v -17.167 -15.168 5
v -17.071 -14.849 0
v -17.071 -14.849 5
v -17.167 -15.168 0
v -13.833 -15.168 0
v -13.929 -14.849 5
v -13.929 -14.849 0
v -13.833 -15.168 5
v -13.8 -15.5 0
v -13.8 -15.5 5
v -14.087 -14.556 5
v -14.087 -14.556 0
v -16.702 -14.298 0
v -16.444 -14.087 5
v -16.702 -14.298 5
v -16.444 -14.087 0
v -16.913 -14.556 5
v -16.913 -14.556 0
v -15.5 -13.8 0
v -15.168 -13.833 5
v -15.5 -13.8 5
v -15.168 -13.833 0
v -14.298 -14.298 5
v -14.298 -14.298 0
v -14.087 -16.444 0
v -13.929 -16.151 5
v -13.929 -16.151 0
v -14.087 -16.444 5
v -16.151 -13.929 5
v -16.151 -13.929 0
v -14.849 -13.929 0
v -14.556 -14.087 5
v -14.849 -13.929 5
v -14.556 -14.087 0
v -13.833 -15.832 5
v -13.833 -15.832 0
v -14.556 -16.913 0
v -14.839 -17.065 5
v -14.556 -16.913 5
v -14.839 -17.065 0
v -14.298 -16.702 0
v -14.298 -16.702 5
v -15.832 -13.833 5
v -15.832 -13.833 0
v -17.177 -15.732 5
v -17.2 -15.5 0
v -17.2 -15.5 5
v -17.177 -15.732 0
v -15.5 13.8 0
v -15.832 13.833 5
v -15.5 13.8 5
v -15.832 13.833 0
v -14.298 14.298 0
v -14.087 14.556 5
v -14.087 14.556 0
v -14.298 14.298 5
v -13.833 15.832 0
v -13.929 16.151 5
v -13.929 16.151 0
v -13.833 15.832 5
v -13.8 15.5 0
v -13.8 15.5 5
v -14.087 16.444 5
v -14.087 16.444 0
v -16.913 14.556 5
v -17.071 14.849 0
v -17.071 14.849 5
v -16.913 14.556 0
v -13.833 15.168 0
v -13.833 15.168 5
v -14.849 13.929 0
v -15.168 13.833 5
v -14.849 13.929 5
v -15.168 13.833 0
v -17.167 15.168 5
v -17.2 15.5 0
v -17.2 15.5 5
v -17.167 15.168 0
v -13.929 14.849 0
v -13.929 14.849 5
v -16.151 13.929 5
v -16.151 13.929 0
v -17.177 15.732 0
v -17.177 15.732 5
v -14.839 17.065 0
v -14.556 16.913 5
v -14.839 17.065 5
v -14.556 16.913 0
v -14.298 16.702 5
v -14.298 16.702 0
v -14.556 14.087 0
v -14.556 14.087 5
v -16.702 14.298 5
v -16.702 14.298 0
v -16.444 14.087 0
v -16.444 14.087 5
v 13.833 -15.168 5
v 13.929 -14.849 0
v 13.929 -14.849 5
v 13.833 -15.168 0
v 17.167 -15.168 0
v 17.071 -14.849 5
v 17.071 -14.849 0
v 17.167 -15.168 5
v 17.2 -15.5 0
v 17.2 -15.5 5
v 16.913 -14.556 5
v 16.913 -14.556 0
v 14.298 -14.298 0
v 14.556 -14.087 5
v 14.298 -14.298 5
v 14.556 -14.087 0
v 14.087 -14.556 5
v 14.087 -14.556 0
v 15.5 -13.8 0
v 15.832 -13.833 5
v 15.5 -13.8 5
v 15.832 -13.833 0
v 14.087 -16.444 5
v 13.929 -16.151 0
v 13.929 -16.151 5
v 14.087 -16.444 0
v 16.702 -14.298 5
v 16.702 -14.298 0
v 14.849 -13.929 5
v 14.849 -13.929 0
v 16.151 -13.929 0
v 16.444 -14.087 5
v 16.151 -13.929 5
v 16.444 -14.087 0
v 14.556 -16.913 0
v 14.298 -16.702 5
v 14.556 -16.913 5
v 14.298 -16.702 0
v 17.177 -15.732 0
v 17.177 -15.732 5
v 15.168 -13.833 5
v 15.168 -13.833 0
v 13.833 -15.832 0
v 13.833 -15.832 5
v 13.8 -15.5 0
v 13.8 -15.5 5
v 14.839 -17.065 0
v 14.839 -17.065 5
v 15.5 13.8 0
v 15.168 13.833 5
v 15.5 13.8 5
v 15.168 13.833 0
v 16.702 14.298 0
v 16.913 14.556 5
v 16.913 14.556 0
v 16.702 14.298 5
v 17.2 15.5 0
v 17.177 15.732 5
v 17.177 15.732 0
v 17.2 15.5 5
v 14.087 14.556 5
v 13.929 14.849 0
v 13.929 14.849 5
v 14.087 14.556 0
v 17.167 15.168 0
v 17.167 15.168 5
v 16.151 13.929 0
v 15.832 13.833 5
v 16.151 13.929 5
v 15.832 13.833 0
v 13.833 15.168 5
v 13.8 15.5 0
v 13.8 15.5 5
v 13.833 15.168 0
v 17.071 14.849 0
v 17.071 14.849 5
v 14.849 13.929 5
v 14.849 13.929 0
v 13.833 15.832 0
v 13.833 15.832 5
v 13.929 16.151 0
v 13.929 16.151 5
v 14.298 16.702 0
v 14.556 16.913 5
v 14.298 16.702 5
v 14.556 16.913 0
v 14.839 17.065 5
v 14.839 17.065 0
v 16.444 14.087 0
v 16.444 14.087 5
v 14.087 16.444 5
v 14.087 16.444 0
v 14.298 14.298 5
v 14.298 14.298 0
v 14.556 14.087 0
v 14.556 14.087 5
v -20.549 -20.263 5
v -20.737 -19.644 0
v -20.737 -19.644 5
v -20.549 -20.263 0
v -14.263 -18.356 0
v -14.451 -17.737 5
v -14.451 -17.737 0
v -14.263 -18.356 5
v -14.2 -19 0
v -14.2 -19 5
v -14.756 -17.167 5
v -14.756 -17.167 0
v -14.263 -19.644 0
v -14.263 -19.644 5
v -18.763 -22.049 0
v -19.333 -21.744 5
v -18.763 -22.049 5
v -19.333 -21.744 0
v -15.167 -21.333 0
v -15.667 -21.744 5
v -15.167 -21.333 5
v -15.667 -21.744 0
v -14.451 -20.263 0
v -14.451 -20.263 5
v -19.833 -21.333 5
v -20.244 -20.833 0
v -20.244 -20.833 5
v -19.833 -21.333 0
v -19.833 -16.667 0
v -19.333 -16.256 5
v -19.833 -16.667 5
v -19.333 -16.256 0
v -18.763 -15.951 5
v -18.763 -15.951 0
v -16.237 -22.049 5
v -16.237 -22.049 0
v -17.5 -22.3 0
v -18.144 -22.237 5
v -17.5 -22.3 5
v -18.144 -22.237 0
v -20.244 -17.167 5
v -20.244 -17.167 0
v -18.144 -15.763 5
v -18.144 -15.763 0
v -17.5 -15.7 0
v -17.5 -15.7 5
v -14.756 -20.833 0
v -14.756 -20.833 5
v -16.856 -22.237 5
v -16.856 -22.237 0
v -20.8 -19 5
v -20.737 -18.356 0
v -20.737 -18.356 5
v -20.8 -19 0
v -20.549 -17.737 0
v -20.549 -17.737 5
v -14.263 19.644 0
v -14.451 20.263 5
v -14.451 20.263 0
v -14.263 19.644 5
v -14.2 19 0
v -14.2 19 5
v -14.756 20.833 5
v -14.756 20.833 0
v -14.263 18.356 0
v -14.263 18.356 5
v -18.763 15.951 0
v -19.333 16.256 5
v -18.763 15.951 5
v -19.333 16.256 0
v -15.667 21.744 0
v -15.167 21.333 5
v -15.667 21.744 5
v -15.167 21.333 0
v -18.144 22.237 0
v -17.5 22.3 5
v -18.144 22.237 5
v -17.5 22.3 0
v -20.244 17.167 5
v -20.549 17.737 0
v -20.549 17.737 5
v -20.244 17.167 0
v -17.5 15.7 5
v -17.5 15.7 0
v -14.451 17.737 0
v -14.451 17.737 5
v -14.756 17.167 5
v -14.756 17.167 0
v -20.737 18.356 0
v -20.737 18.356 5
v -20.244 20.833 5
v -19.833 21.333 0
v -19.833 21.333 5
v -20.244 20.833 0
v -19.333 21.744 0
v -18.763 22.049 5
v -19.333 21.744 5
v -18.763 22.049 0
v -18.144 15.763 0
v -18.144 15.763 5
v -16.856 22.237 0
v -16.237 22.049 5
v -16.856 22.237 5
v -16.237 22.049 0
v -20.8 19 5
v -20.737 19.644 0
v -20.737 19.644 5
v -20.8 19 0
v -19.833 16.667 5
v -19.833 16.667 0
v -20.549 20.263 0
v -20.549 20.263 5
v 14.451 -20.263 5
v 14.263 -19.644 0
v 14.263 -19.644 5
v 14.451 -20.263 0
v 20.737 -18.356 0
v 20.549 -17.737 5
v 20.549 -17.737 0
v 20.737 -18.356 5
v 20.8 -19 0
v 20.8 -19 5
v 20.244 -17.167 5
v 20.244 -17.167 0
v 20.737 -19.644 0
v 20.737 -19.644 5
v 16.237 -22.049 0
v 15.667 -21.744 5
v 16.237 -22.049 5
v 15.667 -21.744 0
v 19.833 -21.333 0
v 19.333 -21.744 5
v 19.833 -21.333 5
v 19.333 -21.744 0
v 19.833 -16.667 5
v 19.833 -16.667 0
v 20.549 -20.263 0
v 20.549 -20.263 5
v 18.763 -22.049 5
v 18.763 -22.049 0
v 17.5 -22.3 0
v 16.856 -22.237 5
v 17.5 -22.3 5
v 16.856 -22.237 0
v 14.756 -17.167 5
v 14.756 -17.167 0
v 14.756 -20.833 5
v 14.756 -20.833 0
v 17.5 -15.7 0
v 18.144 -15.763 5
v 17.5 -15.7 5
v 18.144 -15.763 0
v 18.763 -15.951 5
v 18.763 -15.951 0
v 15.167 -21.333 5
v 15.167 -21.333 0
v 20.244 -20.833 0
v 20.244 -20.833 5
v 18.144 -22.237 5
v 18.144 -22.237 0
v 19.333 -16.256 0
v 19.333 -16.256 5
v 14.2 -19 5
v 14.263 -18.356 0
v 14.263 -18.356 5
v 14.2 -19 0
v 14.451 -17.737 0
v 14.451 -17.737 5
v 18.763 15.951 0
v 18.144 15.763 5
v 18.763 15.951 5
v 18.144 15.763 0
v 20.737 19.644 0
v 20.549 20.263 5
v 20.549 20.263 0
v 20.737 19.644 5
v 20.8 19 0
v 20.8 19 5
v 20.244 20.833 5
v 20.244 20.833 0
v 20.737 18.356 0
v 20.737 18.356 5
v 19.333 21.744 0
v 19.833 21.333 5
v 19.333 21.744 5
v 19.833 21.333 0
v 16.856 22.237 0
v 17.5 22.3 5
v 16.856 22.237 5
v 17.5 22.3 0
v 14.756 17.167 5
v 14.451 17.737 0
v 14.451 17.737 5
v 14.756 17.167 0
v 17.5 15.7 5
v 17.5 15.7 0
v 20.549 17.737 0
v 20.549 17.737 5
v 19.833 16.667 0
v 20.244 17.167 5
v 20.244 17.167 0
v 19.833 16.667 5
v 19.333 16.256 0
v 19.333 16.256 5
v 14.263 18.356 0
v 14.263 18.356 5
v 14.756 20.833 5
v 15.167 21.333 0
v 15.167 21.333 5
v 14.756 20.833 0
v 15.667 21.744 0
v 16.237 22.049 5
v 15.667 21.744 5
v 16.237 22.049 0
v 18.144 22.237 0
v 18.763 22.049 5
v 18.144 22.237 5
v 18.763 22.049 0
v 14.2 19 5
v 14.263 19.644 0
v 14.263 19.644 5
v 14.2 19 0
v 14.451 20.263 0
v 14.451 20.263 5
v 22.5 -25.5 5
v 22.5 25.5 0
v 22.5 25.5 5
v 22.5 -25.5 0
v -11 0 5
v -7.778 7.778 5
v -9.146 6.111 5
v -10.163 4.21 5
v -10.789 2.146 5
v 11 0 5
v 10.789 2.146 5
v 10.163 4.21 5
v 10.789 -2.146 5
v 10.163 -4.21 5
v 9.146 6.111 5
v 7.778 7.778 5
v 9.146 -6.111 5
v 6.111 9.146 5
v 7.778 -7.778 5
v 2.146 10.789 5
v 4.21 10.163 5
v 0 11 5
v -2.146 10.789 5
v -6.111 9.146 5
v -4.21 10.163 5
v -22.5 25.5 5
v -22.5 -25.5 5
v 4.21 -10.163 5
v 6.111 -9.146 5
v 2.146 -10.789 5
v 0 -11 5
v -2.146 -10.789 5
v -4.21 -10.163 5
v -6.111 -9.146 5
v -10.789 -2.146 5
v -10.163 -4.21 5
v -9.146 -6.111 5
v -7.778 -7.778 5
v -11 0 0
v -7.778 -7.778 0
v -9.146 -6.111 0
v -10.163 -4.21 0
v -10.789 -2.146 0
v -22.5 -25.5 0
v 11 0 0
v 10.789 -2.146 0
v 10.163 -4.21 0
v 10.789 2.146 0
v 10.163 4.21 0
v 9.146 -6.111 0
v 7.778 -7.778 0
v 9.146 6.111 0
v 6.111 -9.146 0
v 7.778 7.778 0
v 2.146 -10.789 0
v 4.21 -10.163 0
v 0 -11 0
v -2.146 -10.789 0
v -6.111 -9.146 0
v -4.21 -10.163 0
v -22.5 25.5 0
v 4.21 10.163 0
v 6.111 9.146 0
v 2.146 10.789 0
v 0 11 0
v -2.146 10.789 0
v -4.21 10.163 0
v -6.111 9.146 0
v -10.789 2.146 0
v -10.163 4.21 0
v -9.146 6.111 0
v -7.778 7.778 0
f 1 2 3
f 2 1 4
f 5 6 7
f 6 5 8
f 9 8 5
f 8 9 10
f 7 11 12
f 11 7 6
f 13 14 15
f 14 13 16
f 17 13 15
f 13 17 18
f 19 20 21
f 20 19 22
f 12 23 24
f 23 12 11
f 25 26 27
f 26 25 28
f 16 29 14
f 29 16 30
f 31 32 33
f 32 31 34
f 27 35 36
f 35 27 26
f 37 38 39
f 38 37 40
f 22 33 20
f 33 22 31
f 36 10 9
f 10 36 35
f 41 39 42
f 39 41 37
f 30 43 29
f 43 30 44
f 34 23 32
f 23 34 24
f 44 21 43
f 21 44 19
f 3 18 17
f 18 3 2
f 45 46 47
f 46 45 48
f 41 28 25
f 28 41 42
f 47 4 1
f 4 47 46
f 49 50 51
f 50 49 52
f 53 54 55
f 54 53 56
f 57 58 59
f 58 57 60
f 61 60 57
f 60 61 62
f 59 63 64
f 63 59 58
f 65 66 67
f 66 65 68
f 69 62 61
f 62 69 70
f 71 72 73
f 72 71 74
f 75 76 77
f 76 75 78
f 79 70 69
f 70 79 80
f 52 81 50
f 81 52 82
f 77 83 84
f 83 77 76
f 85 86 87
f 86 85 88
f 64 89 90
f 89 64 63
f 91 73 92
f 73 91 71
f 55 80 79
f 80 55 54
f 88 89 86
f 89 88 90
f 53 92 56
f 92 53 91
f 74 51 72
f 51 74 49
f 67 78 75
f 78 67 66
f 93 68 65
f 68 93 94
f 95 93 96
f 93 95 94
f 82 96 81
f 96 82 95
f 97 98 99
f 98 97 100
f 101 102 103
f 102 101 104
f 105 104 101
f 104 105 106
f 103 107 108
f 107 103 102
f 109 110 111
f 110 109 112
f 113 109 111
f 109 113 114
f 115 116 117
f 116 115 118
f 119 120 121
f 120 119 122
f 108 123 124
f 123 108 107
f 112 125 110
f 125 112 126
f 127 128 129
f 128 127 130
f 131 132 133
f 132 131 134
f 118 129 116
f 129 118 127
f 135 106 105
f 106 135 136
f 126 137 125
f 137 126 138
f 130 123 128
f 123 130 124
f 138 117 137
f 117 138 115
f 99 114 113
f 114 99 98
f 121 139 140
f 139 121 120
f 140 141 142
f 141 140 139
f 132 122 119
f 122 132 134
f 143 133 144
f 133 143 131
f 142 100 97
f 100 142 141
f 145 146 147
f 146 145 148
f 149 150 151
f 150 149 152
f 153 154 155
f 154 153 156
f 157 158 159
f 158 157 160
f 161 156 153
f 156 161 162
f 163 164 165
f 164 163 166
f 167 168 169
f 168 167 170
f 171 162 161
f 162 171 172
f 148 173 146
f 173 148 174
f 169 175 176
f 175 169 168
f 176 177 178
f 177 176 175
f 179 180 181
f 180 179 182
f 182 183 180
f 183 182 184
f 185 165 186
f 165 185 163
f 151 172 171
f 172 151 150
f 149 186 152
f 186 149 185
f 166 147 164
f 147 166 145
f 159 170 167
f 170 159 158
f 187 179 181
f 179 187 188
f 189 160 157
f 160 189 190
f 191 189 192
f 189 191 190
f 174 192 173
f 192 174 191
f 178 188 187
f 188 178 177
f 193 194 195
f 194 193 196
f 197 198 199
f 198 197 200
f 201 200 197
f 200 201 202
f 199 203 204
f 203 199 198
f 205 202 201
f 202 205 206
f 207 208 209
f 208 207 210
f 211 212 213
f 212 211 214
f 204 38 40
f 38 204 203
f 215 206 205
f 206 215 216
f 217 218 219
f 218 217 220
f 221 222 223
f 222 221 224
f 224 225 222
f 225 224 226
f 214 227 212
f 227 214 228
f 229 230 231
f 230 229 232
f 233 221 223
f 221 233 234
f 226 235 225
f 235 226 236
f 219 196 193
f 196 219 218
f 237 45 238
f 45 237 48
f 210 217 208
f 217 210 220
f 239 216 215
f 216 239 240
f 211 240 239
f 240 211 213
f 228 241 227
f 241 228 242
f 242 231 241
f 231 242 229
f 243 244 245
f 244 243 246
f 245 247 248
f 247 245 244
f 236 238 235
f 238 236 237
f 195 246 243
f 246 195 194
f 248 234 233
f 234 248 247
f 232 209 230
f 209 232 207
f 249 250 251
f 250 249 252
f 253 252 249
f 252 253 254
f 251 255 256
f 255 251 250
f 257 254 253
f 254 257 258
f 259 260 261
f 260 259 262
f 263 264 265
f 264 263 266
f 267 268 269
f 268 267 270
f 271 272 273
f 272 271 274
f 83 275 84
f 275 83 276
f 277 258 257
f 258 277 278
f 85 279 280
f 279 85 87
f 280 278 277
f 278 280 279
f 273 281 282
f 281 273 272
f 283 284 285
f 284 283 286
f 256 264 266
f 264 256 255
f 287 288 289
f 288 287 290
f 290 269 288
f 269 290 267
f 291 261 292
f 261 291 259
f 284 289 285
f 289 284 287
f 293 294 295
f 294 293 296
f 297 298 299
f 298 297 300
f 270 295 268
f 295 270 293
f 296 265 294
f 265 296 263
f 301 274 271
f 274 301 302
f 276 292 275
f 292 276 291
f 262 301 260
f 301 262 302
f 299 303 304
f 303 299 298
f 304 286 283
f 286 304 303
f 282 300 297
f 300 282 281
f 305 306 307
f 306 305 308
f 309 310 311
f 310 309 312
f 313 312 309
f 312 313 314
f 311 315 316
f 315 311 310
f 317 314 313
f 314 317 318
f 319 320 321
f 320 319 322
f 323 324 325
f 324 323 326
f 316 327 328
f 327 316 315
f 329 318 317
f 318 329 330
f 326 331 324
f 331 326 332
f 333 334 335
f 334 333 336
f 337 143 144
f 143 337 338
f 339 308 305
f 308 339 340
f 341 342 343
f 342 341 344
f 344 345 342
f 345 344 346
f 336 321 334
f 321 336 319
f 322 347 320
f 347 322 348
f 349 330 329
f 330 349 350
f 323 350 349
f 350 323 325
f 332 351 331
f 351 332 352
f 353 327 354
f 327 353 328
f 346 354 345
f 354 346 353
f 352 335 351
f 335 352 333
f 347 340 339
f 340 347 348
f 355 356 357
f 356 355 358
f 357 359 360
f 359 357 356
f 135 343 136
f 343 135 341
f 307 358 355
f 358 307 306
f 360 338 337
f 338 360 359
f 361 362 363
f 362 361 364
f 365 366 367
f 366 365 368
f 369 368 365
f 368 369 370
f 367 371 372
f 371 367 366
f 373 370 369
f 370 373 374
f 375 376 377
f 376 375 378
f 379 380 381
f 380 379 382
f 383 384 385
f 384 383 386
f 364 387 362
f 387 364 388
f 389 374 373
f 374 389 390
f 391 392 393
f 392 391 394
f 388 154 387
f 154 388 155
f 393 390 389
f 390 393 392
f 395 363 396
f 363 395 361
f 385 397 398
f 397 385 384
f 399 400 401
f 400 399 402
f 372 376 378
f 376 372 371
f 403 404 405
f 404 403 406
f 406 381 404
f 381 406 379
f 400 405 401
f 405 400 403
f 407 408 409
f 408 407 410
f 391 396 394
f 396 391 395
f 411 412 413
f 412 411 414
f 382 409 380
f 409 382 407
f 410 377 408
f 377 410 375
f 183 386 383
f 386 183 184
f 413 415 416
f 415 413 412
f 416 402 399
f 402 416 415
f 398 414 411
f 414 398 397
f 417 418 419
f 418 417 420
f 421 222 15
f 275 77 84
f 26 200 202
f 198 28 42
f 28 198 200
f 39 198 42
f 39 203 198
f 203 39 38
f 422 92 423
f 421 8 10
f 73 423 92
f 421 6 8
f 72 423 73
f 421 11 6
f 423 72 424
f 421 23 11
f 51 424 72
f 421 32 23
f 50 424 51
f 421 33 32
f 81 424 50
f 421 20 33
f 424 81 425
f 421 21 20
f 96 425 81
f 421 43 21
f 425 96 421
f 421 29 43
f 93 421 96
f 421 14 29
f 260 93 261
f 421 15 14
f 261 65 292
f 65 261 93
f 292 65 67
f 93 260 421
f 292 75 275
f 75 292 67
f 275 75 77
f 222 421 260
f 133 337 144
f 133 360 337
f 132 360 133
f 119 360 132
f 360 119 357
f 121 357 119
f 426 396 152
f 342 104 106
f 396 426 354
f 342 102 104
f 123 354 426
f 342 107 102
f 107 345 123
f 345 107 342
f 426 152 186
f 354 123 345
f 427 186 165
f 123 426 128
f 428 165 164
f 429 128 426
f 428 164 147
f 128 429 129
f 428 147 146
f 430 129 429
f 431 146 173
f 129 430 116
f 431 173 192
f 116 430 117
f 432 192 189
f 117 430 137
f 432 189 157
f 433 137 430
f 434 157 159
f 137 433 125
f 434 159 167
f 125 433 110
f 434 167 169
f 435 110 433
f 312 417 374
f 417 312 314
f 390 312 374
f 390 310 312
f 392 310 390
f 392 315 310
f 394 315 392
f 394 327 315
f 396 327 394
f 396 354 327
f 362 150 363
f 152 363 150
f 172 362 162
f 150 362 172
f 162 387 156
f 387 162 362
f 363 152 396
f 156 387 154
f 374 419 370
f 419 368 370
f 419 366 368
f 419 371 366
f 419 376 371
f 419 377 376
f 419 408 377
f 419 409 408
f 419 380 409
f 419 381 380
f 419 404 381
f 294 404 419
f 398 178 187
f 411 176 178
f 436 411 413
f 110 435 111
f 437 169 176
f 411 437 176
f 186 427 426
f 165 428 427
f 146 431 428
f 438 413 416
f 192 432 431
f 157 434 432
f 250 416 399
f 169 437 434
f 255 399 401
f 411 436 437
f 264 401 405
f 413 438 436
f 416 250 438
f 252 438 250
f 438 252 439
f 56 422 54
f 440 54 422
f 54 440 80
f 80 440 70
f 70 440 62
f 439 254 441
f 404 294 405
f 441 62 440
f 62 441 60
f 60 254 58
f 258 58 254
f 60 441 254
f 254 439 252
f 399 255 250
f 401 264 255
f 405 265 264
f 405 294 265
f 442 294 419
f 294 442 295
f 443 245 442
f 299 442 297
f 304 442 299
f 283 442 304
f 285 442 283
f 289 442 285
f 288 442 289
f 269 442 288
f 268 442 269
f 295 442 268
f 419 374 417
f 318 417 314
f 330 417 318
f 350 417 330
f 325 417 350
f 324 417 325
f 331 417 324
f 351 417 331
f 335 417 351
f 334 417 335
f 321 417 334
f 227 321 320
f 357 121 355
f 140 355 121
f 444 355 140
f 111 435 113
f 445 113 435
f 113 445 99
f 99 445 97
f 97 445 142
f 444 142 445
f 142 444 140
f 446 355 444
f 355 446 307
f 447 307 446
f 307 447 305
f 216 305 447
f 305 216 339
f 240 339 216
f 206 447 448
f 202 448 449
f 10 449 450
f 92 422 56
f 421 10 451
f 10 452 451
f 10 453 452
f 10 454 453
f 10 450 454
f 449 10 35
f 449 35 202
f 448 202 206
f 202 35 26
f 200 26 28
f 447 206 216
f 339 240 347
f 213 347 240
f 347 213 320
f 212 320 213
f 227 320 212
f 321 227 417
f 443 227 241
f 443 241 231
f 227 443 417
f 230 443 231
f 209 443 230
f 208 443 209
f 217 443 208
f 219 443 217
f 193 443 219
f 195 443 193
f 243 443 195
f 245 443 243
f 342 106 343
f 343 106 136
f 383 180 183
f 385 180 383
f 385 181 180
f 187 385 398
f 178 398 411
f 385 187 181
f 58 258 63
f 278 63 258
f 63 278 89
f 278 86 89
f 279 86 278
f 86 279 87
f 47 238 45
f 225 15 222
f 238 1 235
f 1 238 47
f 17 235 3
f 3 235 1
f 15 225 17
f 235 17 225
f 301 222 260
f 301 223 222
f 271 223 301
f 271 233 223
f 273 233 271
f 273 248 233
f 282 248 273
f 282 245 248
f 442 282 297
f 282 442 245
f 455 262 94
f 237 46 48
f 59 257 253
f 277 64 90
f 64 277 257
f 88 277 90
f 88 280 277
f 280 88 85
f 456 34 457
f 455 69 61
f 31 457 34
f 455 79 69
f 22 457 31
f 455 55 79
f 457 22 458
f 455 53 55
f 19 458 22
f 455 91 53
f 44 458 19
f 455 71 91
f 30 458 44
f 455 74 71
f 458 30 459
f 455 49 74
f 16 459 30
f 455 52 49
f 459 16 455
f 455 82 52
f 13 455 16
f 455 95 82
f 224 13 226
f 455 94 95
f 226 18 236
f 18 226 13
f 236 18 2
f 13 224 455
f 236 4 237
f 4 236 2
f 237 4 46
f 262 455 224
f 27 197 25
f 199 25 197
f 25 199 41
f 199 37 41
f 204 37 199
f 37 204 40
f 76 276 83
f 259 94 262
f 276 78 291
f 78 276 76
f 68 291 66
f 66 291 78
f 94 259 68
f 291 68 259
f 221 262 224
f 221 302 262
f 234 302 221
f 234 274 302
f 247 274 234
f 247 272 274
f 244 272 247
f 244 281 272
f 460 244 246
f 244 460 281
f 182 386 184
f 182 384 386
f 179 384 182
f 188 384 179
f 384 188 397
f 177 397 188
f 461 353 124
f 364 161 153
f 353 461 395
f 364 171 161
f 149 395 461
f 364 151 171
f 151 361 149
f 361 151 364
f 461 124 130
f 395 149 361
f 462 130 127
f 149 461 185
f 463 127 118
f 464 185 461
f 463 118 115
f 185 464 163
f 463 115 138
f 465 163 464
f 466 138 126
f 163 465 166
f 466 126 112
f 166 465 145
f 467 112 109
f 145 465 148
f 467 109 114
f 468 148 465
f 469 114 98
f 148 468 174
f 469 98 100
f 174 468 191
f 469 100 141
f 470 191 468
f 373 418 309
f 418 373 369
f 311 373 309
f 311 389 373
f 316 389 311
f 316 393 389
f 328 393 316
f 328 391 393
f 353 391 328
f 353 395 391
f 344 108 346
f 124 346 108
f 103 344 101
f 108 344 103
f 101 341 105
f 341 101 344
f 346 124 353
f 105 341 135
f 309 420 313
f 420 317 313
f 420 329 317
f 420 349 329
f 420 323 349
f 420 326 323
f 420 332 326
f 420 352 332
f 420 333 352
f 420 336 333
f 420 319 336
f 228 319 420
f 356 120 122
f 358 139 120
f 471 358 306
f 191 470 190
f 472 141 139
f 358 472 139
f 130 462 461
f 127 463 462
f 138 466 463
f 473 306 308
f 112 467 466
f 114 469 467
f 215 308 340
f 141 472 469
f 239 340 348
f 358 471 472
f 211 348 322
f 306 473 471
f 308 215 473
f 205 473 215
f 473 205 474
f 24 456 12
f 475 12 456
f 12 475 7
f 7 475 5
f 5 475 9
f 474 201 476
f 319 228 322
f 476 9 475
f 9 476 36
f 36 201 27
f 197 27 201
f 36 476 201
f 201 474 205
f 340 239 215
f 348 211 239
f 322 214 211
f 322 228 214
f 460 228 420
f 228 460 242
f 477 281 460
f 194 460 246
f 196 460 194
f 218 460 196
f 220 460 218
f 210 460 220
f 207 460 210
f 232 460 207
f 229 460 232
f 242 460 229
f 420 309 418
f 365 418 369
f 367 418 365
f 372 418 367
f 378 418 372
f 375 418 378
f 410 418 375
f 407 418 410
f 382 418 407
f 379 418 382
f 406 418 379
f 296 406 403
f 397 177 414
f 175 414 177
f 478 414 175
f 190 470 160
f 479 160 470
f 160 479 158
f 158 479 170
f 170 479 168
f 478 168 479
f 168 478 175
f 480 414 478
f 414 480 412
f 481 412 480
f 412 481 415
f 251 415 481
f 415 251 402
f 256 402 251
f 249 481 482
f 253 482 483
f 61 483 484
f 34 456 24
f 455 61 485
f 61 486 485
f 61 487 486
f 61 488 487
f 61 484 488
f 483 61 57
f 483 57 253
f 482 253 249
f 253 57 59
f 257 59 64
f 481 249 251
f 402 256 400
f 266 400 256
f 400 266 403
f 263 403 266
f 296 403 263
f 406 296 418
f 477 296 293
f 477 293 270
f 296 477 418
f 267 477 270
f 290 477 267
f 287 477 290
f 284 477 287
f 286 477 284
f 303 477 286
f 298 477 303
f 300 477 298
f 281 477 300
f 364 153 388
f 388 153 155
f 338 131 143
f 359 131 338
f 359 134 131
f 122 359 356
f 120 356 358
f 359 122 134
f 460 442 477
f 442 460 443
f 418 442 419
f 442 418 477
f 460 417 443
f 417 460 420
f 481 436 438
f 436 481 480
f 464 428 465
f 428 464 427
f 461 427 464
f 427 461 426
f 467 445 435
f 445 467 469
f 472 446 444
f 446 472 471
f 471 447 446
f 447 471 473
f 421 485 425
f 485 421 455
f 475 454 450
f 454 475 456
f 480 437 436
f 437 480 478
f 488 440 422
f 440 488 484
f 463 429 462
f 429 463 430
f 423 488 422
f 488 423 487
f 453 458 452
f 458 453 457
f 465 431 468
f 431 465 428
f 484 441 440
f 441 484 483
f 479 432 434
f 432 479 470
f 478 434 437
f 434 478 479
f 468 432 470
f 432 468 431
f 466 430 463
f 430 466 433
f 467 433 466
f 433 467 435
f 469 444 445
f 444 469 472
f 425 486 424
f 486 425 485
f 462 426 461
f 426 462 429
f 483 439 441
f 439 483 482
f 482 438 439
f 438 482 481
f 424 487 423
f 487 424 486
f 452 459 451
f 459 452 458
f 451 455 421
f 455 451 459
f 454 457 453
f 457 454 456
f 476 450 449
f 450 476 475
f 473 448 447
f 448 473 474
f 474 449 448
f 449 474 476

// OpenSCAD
$fn = 32;

// ----------------------------------------------------------------------
// Motor mount plate: NEMA17, 45 x 51 x 5 mm
// ----------------------------------------------------------------------

// --- parameters (mm) ---
mount_w = 45;             // plate length, X
mount_d = 51;             // plate width, Y
mat_t = 5;                // plate thickness
motor_pitch = 31;         // NEMA17 bolt spacing
motor_d = 3.4;            // NEMA17 screw clearance
center_bore = 22;         // pilot boss bore
second_d = 6.6;           // second fastener hole

module plate() {
  translate([-mount_w / 2, -mount_d / 2, 0]) cube([mount_w, mount_d, mat_t]);
}

module motor_holes() {
  for (sx = [-1, 1]) for (sy = [-1, 1])
    translate([sx * motor_pitch / 2, sy * motor_pitch / 2, -1])
      cylinder(h = mat_t + 2, d = motor_d);
}

difference() {
  union() {
    plate();
  }
  motor_holes();
  translate([0, 0, -1]) cylinder(h = mat_t + 2, d = center_bore);
  for (sx = [-1, 1]) for (sy = [-1, 1])
    translate([sx * 17.5, sy * 19, -1]) cylinder(h = mat_t + 2, d = second_d);
}
